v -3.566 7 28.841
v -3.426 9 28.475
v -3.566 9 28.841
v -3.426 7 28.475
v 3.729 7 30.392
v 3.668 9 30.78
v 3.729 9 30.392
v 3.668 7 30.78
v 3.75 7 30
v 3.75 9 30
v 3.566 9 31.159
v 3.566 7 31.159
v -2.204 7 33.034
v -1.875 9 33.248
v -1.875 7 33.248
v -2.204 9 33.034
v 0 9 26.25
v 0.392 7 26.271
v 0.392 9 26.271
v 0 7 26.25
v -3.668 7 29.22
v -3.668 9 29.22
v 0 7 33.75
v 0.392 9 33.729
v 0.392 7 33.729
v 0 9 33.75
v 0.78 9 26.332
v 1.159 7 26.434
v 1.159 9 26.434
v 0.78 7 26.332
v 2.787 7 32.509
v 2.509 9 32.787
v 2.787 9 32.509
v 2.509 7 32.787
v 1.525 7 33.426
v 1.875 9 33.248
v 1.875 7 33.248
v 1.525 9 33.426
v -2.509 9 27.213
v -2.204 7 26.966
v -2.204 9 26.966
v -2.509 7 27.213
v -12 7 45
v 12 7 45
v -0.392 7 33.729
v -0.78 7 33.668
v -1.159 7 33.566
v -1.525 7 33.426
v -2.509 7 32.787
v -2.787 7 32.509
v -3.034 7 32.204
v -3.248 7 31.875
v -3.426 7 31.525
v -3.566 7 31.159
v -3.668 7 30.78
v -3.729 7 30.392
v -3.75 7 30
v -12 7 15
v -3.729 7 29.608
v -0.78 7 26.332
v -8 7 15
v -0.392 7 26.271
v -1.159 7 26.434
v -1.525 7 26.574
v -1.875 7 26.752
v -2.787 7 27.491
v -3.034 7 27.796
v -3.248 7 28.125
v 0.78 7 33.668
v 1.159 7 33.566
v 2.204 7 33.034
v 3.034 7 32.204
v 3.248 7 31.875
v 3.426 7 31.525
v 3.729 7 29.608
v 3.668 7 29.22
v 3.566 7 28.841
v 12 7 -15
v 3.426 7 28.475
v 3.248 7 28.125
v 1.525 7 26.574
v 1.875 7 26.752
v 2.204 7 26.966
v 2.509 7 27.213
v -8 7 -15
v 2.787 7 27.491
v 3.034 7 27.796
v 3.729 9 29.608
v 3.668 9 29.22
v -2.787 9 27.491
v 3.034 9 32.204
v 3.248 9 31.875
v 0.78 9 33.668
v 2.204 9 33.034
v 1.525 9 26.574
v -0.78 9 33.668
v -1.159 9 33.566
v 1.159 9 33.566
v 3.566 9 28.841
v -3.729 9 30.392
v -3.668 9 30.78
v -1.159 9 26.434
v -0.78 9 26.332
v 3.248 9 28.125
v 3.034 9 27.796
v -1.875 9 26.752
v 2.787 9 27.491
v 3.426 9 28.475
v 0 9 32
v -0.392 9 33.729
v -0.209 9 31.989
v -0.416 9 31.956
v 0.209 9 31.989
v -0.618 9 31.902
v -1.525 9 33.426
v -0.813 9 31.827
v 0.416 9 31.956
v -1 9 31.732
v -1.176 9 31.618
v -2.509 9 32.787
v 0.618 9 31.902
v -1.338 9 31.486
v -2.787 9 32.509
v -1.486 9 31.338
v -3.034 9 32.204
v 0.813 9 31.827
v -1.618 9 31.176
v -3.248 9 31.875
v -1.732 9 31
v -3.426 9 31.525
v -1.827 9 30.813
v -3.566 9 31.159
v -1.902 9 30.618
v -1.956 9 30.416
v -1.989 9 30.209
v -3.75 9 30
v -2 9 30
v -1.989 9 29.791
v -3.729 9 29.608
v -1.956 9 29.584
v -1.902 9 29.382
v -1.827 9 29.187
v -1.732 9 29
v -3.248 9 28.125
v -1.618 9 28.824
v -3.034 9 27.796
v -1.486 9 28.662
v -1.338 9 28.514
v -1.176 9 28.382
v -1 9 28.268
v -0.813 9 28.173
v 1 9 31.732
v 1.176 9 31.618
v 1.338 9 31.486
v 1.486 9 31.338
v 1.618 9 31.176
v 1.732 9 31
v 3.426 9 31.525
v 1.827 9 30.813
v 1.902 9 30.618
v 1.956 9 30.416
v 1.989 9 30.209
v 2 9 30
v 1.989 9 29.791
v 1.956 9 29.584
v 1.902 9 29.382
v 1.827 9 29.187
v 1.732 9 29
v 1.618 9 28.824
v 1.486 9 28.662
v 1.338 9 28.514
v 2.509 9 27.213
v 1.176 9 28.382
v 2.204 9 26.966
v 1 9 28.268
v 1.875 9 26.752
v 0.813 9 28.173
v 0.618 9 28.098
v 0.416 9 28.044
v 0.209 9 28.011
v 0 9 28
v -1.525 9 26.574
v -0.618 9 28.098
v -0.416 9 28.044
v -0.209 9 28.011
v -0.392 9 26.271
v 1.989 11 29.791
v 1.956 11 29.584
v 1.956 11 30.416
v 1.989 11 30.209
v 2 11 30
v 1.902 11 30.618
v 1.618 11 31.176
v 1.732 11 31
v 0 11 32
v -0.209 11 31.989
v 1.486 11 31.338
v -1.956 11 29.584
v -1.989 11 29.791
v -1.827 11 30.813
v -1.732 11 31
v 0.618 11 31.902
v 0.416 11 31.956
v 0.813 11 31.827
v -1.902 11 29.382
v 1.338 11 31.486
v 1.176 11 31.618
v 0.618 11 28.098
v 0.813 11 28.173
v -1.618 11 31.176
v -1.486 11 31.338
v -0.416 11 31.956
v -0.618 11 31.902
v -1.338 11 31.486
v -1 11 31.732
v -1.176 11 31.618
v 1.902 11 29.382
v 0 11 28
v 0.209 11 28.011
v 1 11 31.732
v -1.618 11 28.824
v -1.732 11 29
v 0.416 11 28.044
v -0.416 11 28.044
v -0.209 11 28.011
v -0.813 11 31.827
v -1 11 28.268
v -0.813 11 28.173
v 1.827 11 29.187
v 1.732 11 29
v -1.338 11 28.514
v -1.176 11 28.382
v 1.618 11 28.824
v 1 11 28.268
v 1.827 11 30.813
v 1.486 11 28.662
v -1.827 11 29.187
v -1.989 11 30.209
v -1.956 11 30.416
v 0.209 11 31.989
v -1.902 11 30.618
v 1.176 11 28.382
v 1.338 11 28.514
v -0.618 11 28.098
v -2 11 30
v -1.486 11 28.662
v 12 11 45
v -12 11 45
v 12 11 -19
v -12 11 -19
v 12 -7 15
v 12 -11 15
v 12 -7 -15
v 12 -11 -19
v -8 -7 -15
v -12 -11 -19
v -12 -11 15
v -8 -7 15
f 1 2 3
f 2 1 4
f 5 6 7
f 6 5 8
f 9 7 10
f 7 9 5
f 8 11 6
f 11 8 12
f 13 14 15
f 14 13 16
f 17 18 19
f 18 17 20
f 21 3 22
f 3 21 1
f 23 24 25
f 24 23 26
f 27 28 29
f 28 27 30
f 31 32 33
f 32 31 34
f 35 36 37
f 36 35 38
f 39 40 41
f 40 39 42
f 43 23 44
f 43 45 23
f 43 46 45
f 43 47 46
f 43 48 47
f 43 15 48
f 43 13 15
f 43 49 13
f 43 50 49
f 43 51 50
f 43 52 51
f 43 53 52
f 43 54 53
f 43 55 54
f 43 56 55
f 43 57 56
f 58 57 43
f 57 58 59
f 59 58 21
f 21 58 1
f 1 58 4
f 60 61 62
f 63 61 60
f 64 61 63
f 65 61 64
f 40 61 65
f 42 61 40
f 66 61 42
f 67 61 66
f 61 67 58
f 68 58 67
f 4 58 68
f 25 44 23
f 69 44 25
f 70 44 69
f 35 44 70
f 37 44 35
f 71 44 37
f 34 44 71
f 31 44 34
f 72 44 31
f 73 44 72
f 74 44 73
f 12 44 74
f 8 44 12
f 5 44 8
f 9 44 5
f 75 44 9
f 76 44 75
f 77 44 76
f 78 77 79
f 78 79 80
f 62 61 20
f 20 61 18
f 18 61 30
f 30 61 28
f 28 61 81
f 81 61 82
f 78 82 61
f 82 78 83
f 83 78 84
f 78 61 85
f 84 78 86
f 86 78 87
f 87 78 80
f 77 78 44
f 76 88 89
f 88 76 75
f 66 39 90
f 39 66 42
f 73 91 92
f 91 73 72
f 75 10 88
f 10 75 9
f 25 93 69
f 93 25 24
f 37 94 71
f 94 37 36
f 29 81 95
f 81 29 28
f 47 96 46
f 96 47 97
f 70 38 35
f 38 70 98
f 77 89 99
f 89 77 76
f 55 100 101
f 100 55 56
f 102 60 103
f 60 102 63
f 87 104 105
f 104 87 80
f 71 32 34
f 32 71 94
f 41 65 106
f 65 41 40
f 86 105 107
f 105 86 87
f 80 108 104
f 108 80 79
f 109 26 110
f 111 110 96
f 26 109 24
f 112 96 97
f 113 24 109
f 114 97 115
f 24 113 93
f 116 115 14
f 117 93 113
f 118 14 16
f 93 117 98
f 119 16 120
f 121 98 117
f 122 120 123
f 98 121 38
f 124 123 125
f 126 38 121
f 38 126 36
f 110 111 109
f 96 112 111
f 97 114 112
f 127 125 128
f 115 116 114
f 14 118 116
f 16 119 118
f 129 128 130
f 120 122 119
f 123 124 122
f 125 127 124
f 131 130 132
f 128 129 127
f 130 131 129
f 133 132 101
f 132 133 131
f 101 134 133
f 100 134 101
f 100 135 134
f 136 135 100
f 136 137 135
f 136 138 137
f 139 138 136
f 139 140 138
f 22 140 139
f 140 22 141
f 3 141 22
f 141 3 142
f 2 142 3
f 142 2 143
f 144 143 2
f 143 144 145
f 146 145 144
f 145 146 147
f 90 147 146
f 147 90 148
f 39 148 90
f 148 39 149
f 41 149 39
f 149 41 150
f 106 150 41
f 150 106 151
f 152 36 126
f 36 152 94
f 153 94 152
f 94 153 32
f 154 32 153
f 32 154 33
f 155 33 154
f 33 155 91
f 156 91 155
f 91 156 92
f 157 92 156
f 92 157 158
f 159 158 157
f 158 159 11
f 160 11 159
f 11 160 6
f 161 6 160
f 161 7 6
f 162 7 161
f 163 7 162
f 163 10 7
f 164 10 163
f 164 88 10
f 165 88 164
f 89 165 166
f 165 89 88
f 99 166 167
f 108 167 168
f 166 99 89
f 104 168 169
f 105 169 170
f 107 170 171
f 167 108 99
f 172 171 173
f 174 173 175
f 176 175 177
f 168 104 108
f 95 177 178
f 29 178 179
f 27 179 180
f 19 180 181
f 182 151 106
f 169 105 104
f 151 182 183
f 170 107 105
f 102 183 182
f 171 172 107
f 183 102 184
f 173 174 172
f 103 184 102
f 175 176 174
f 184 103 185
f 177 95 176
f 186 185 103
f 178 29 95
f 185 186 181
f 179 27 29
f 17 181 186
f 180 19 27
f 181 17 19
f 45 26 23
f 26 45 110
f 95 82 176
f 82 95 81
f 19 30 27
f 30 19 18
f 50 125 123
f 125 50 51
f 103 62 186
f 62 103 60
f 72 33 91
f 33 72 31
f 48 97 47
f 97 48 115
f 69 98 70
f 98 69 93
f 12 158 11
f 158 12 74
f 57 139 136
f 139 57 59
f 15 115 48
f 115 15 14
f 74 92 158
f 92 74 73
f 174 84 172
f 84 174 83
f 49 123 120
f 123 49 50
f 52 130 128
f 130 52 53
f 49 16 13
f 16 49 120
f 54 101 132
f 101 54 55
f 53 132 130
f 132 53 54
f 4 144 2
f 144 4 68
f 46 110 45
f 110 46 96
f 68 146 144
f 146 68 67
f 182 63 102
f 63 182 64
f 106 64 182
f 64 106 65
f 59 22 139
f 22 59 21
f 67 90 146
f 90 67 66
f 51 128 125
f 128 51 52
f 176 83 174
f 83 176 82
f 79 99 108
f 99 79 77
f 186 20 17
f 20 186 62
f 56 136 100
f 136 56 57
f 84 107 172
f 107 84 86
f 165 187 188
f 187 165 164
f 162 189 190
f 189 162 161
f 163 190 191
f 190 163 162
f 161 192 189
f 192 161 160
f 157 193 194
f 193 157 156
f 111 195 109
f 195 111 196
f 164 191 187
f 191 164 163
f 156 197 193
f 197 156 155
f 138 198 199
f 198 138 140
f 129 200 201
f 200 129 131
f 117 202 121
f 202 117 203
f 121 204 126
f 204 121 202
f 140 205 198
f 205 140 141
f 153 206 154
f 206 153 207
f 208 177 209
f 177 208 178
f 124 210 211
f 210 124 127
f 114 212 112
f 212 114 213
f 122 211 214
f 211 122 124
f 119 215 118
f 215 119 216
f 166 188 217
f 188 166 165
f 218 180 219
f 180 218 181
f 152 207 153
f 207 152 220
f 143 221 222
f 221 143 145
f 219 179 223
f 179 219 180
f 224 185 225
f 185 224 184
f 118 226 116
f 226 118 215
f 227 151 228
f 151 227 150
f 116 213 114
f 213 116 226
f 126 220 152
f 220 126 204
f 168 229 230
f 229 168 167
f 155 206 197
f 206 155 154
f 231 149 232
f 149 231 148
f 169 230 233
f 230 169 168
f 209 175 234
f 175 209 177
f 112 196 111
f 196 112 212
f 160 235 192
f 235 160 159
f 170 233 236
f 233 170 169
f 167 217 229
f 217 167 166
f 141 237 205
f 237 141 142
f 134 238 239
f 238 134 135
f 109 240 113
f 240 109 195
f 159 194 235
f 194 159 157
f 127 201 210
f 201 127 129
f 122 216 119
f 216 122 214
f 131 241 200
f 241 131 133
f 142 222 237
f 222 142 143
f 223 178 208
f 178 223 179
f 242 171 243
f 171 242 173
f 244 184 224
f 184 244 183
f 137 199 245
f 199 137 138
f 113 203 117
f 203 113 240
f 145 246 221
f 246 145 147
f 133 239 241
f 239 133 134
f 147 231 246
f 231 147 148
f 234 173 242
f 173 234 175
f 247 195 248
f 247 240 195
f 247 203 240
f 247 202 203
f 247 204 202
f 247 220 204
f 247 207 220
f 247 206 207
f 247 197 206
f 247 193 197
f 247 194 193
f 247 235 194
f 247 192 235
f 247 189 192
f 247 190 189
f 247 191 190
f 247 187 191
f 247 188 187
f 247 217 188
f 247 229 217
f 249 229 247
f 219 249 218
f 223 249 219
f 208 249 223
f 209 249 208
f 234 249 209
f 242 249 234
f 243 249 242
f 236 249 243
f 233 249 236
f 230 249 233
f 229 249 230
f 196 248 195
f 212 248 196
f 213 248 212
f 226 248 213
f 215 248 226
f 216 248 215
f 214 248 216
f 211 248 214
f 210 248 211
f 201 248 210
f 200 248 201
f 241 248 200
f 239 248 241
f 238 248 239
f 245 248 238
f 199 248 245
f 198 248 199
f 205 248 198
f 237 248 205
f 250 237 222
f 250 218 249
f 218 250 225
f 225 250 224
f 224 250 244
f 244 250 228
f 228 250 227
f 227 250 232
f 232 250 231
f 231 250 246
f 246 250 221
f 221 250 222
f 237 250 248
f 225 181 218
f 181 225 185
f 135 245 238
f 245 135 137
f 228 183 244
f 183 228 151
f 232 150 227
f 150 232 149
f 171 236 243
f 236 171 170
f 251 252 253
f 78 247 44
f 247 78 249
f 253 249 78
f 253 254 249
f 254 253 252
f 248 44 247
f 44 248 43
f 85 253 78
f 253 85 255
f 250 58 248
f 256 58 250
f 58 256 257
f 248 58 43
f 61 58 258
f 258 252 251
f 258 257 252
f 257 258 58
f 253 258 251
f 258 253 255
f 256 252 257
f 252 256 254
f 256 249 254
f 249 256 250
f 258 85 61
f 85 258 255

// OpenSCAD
$fn = 60;



//length(1/4th of tablet width)
x1 = 30;
//width(from edge to bezzle)
x2 = 20;
//thickness of tablet
x3 = 14;

//walls thinkness(default4)
x4 = 4;

//screw (50/50 for head and thread /x4 walls
//head
xd1 = 7.5;
//thread
xd2 = 4;

module screw(){
//screw head
union(){
translate([0,0,x4/2/2])
cylinder(h = x4/2, d1 = xd1, d2 = xd1, 
    center = true);
//screw thread
translate([0,0,-x4/2/2])
cylinder(h = x4/2, d1 = xd2, d2 = xd2, center = true);}
}
//top
rotate([0,0,0])
translate([0,-x3/2+-x4/2,0])
cube([x2+x4,x4,x1], center=true);


//back
difference(){
rotate([0,0,0])
translate([0,x3/2+x4/2,x1/2])
cube([x2+x4,x4,x1*2], center=true);
rotate([90,0,0])
//hole
translate([0,x1,-x3/2-x4/2])
#screw();}

//bottom
rotate([0,0,0])
translate([0,0,-x1/2+-x4/2])
cube([x2+x4,x3+x4*2,x4], center=true);


//side
rotate([0,0,0])
translate([-x2/2+x4+-x4,0,0])
cube([x4,x3,x1], center=true);
